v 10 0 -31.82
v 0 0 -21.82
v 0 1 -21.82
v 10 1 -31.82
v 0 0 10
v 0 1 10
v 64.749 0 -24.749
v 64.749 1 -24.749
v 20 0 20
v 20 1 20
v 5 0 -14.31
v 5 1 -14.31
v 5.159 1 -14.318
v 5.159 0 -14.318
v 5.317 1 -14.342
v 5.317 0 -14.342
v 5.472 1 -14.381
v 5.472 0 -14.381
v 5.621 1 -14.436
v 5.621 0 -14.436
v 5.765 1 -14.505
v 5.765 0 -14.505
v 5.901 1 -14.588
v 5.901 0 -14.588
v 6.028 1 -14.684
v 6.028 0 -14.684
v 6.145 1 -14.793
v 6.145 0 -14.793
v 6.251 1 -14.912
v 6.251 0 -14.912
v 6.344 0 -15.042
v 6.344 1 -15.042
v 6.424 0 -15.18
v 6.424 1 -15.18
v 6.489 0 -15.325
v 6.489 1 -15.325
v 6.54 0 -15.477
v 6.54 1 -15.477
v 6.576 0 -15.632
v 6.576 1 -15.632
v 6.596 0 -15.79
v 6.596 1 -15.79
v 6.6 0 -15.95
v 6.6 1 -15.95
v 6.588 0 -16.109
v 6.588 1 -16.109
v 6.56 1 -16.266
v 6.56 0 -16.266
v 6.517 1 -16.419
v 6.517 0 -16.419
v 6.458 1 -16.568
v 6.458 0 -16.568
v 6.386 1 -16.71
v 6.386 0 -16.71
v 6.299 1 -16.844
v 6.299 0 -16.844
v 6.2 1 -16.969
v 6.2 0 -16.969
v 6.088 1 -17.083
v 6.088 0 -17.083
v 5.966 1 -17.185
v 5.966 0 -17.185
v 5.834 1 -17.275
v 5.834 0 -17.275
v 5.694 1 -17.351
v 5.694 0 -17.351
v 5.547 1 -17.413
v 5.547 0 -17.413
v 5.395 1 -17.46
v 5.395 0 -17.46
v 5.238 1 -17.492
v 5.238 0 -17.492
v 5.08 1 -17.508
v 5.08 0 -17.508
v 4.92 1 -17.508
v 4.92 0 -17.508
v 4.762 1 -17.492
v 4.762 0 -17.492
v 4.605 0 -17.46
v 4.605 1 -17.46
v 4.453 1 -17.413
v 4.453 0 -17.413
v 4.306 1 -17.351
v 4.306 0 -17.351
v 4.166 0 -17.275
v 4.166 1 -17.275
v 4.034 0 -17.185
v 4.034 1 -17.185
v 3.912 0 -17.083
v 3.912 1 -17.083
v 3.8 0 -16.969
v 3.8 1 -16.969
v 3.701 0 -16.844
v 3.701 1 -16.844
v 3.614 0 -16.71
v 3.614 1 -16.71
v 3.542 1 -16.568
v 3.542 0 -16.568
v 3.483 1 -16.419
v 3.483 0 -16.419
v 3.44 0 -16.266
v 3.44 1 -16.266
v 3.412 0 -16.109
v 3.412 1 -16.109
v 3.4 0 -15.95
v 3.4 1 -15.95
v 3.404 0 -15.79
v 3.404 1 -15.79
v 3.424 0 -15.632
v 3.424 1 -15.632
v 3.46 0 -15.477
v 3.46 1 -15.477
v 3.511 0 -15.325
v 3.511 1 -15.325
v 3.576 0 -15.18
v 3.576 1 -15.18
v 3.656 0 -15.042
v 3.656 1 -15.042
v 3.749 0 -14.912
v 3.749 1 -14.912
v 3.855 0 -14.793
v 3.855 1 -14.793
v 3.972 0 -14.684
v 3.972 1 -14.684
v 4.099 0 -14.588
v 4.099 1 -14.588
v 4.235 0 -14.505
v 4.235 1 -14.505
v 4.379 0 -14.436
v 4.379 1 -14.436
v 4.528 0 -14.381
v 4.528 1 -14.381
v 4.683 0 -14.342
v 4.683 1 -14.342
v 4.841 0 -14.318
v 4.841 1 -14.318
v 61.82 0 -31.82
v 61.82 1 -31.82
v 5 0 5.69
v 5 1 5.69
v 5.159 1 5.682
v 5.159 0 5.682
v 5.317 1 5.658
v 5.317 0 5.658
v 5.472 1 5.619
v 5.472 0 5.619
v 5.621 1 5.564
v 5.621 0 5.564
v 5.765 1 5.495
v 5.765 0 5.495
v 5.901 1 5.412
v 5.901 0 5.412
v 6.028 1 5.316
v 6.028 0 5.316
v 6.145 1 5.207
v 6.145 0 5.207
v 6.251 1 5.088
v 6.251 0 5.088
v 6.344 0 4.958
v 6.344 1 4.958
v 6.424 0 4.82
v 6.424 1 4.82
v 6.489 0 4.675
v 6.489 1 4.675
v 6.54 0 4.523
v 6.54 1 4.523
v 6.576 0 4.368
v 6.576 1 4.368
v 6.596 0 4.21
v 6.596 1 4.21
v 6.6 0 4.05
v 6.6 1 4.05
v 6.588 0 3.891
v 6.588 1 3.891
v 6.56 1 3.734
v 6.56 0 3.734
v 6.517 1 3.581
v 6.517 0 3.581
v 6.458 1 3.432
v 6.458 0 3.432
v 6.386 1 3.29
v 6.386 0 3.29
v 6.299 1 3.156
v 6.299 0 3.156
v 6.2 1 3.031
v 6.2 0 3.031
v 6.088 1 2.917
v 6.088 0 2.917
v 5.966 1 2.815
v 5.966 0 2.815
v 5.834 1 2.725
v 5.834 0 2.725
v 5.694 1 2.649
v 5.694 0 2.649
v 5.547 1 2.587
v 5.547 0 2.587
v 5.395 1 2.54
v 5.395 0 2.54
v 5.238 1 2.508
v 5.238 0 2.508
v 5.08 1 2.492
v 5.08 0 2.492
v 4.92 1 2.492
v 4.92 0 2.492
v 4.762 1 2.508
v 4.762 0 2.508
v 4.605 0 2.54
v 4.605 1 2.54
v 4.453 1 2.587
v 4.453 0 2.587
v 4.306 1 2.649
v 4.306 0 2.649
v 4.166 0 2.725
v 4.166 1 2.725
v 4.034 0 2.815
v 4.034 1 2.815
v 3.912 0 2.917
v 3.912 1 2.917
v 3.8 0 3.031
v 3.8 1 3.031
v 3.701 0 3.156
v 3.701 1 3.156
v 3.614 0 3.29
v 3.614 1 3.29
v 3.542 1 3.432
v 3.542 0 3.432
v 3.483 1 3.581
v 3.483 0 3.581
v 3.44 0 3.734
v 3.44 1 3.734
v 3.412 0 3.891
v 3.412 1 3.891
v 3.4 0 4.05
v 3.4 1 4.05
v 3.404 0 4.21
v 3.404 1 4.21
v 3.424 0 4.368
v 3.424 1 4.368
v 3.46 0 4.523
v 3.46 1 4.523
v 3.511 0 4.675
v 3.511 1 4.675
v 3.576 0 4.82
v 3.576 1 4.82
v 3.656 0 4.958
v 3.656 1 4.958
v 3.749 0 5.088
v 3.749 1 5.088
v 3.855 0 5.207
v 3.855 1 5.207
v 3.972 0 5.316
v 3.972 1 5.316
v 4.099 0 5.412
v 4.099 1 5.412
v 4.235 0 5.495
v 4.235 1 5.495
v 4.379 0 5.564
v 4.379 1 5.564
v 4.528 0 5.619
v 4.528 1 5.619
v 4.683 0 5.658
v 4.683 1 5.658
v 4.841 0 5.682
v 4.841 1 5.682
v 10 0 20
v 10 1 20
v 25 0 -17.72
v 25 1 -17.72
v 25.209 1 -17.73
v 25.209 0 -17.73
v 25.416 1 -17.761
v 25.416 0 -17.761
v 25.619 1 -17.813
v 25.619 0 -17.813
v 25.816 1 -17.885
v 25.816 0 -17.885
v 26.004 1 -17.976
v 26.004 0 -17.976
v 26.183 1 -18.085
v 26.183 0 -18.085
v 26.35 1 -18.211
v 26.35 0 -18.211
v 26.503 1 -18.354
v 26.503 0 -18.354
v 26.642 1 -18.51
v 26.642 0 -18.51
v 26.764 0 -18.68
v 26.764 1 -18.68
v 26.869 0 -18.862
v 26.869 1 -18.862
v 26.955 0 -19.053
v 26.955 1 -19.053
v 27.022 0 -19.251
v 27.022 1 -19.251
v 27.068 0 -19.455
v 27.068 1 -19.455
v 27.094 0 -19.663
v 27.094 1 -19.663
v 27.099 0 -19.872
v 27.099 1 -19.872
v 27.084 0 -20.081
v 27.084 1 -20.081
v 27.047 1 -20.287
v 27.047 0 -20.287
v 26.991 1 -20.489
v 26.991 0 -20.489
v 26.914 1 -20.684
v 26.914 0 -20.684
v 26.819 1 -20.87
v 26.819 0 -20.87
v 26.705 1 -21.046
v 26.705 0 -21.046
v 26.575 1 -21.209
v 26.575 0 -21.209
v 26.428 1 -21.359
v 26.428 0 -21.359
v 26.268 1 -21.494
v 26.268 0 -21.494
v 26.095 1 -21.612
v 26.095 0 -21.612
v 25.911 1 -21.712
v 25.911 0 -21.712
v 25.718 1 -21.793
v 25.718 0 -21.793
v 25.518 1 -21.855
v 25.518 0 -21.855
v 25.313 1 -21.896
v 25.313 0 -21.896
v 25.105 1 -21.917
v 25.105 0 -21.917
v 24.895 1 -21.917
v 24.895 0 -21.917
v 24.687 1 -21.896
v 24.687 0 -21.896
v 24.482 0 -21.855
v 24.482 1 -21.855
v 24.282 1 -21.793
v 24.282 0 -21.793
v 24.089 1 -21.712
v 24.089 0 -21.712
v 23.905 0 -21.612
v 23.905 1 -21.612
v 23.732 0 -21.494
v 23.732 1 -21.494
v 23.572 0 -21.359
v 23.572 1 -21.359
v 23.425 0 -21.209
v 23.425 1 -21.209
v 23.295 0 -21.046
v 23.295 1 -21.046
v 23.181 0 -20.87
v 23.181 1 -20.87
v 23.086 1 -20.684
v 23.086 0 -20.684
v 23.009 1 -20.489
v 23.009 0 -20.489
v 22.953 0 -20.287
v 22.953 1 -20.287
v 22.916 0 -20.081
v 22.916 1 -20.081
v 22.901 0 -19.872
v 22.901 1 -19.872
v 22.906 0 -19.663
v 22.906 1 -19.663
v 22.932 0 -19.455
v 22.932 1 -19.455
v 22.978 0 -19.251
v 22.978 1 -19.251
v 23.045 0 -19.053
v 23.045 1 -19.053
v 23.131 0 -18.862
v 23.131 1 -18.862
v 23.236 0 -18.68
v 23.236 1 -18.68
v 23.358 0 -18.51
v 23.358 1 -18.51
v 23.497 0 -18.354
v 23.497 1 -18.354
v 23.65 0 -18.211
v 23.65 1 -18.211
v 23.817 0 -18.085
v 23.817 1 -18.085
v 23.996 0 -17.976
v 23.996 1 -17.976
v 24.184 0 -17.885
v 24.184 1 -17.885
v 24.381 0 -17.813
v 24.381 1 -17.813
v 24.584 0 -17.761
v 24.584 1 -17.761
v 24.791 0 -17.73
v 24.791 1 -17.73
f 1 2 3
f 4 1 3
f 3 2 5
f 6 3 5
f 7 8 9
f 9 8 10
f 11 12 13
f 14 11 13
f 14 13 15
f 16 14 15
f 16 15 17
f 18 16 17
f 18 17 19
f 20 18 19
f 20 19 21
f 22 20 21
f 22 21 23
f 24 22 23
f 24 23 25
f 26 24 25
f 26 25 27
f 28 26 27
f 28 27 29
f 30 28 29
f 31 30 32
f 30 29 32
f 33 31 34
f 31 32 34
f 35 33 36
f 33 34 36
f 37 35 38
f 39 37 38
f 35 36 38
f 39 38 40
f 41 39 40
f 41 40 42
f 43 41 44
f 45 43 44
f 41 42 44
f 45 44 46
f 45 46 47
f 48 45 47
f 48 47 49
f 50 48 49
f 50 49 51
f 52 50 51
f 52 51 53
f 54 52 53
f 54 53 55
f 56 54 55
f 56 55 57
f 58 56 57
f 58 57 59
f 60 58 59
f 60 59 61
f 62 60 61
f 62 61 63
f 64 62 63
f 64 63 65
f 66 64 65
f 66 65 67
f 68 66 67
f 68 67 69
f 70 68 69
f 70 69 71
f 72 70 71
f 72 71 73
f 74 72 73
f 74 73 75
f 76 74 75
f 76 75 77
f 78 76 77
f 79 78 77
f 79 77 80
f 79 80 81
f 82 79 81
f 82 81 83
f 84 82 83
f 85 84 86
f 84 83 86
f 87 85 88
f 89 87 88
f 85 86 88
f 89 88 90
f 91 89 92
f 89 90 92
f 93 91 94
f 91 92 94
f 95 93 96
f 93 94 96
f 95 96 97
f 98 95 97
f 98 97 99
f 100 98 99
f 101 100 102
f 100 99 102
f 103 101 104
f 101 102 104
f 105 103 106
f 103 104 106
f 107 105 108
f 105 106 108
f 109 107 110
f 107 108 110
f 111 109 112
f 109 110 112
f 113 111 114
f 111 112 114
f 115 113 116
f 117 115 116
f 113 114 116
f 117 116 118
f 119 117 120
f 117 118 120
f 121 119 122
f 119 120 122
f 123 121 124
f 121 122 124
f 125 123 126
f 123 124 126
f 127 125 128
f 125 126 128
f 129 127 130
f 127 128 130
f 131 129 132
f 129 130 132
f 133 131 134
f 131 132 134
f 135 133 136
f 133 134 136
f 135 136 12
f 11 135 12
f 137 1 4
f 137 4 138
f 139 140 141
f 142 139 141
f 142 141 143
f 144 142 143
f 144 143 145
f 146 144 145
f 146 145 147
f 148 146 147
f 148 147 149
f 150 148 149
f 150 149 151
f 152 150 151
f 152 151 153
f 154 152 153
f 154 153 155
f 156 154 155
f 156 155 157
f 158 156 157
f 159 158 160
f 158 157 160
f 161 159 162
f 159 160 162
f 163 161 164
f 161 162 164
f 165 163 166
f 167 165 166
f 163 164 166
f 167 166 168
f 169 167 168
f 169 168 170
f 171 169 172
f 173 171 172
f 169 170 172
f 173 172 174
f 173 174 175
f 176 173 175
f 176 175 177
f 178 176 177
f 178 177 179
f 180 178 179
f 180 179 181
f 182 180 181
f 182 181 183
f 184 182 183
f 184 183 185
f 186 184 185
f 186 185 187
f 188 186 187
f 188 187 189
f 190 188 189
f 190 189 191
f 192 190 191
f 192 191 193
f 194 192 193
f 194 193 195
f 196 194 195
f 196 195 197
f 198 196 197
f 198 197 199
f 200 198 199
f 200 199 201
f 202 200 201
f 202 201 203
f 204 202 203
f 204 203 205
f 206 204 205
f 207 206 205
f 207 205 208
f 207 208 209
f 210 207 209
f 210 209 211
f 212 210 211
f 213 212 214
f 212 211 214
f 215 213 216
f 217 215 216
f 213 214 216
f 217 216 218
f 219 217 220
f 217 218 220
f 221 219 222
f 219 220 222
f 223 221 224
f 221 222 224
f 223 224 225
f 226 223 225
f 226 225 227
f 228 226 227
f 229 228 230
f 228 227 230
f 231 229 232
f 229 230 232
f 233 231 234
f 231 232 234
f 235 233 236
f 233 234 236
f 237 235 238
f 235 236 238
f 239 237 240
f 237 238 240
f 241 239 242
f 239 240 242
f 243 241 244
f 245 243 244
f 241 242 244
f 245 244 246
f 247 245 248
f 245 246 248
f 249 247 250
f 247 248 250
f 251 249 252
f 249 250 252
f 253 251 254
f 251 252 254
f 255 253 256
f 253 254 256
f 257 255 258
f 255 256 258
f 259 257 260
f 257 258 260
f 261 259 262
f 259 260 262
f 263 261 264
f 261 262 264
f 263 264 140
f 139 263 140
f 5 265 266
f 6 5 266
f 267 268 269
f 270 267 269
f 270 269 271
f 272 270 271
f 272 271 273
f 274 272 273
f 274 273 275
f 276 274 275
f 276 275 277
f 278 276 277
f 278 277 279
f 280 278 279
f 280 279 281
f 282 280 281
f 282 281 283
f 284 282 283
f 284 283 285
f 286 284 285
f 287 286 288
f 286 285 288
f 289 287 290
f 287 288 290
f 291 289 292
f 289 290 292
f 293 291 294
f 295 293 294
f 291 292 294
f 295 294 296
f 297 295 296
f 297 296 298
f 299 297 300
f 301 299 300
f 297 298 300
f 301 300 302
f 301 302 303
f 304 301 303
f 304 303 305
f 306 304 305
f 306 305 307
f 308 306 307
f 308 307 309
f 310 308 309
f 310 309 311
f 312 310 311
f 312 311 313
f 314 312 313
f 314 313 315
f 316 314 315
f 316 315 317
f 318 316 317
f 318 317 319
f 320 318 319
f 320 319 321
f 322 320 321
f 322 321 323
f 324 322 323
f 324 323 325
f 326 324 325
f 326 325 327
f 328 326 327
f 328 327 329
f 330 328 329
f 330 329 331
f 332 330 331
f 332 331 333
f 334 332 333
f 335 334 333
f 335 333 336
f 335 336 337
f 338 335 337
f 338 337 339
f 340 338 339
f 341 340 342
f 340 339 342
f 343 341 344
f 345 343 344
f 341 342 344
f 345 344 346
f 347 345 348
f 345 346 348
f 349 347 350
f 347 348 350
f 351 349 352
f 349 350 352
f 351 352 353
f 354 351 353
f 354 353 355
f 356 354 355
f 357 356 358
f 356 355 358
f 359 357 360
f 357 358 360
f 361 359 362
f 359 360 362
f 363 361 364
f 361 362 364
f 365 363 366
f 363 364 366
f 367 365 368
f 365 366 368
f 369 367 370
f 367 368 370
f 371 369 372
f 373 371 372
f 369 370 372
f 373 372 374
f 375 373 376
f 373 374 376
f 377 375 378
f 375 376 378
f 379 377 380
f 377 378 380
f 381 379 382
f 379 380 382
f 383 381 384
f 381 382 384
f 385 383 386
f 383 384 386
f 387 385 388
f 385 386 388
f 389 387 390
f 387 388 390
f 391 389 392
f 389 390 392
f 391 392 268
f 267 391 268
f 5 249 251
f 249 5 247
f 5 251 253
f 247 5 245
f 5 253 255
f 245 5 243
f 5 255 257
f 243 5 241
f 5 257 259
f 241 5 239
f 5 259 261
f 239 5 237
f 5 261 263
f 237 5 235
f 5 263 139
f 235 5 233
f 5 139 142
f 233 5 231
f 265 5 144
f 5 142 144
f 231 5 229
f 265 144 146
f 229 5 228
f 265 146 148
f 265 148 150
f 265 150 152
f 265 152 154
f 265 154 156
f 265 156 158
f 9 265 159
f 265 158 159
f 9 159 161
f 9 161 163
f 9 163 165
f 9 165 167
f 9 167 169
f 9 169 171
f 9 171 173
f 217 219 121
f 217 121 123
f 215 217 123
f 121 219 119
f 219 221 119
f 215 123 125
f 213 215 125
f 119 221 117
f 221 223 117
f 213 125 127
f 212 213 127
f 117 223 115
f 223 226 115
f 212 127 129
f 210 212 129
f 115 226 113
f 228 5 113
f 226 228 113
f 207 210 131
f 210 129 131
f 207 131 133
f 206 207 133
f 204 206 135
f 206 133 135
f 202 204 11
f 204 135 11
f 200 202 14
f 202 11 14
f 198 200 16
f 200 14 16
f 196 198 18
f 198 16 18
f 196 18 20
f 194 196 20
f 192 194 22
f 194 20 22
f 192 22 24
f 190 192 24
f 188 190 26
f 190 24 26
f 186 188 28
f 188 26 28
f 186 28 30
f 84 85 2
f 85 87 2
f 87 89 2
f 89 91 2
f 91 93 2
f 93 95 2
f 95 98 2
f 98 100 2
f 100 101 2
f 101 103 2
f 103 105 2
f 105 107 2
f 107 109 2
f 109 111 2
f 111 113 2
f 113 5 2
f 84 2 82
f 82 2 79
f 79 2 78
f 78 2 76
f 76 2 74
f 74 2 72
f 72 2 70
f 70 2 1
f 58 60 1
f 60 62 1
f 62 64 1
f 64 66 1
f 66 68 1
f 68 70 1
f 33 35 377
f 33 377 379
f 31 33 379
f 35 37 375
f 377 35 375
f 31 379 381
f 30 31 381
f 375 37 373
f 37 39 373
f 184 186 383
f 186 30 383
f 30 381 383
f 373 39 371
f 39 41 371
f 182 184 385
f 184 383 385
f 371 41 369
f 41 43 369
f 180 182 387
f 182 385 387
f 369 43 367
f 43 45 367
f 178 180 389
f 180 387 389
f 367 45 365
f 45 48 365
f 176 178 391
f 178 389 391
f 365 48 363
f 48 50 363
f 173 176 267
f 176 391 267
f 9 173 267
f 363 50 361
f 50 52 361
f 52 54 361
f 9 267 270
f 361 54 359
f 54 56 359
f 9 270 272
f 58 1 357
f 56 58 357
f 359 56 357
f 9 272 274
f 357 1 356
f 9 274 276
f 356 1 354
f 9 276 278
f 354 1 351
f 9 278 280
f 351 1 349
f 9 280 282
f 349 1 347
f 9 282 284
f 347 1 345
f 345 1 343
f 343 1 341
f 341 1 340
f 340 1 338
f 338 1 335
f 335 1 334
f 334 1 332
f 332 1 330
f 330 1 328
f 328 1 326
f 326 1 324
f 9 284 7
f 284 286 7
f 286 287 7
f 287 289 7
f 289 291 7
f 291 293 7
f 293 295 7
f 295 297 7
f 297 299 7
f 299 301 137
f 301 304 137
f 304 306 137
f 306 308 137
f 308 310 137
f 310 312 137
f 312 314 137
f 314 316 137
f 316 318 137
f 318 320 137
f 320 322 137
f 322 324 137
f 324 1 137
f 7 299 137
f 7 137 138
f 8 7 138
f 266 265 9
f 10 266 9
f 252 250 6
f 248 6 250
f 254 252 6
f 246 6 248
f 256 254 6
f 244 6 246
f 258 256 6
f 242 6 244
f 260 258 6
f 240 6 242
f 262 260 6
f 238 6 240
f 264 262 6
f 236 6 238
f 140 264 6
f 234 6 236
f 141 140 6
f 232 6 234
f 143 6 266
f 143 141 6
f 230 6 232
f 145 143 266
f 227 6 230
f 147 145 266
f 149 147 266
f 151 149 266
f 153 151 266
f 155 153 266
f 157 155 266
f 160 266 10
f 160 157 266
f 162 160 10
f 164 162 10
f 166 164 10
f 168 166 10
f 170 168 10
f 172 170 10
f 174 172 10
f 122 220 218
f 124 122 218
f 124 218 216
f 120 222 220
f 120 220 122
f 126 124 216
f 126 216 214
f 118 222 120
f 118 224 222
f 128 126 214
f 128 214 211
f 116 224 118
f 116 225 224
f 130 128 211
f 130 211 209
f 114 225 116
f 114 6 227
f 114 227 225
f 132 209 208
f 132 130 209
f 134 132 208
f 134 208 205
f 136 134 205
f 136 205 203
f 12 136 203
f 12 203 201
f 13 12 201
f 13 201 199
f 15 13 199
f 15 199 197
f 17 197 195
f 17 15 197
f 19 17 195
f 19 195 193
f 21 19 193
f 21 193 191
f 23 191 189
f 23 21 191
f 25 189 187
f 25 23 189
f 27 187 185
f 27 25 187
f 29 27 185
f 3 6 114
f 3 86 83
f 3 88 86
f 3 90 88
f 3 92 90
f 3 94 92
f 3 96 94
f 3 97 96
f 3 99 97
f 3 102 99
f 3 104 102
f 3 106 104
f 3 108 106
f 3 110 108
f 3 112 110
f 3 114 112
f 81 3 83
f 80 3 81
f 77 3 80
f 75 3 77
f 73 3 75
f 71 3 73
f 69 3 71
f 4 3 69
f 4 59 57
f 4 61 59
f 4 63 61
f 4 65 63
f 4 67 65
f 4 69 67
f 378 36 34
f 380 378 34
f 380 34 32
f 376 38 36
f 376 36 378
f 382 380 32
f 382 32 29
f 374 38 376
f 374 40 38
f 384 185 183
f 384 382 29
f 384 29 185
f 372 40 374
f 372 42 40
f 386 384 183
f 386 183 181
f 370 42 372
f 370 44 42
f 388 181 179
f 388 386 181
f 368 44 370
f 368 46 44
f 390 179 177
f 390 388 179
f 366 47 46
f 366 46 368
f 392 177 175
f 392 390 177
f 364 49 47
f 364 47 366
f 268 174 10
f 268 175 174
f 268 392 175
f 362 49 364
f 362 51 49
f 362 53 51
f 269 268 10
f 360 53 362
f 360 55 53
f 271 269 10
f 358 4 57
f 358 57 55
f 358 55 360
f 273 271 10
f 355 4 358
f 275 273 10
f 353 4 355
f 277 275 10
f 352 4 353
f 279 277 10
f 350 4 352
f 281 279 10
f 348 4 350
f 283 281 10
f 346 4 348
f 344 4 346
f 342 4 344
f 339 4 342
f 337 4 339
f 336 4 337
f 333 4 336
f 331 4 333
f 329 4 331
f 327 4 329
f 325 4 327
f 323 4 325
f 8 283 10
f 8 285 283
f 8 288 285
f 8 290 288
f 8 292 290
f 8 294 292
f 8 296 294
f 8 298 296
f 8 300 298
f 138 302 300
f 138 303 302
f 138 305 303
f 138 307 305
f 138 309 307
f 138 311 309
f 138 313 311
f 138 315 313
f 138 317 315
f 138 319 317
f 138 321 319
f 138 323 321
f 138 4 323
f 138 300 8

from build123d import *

# Parameters (mm, degrees)
SKETCH_1_W          = 80
SKETCH_1_H          = 31.819805153
SKETCH_1_H_2        = 20
EXTRUDE_1_DEPTH     = 1
CUT_EXTRUDE_1_DEPTH = 10
CHAMFER_1_SIZE      = 10
SKETCH_4_R          = 1.6
SKETCH_4_R_2        = 2.1
CUT_EXTRUDE_2_DEPTH = 10


with BuildPart() as part:
    # 草图1 → 凸台-拉伸1 (new body)
    with BuildSketch(Plane(origin=(0, 0, 0), x_dir=(1, 0, 0), z_dir=(0, 1, 0))):
        with Locations((40, 15.909902577)):
            Rectangle(SKETCH_1_W, SKETCH_1_H)
        with Locations((40, -10)):
            Rectangle(SKETCH_1_W, SKETCH_1_H_2)
    extrude(amount=EXTRUDE_1_DEPTH)

    # 草图3 → 切除-拉伸1 (cut)
    with BuildSketch(Plane(origin=(0, 1, 0), x_dir=(1, 0, 0), z_dir=(0, 1, 0))):
        Polygon((80, -20), (80, 40), (20, -20), align=None)
    extrude(amount=-CUT_EXTRUDE_1_DEPTH, mode=Mode.SUBTRACT)

    # 倒角1
    chamfer_1_edges = [part.edges().sort_by_distance(p)[0] for p in [
        (0, 0.5, 20),
        (71.819805153, 0.5, -31.819805153),
        (0, 0.5, -31.819805153),
    ]]
    chamfer(chamfer_1_edges, length=CHAMFER_1_SIZE)

    # 草图4 → 切除-拉伸2 (cut)
    with BuildSketch(Plane(origin=(0, 1, 0), x_dir=(1, 0, 0), z_dir=(0, 1, 0))):
        with Locations(Location((5, 15.909902577, 0), (0, 0, 270))):
            Circle(SKETCH_4_R)
        with Locations(Location((5, -4.090097423, 0), (0, 0, 270))):
            Circle(SKETCH_4_R)
        with Locations(Location((25, 19.819805153, 0), (0, 0, 270))):
            Circle(SKETCH_4_R_2)
    extrude(amount=-CUT_EXTRUDE_2_DEPTH, mode=Mode.SUBTRACT)


solid = part.part
